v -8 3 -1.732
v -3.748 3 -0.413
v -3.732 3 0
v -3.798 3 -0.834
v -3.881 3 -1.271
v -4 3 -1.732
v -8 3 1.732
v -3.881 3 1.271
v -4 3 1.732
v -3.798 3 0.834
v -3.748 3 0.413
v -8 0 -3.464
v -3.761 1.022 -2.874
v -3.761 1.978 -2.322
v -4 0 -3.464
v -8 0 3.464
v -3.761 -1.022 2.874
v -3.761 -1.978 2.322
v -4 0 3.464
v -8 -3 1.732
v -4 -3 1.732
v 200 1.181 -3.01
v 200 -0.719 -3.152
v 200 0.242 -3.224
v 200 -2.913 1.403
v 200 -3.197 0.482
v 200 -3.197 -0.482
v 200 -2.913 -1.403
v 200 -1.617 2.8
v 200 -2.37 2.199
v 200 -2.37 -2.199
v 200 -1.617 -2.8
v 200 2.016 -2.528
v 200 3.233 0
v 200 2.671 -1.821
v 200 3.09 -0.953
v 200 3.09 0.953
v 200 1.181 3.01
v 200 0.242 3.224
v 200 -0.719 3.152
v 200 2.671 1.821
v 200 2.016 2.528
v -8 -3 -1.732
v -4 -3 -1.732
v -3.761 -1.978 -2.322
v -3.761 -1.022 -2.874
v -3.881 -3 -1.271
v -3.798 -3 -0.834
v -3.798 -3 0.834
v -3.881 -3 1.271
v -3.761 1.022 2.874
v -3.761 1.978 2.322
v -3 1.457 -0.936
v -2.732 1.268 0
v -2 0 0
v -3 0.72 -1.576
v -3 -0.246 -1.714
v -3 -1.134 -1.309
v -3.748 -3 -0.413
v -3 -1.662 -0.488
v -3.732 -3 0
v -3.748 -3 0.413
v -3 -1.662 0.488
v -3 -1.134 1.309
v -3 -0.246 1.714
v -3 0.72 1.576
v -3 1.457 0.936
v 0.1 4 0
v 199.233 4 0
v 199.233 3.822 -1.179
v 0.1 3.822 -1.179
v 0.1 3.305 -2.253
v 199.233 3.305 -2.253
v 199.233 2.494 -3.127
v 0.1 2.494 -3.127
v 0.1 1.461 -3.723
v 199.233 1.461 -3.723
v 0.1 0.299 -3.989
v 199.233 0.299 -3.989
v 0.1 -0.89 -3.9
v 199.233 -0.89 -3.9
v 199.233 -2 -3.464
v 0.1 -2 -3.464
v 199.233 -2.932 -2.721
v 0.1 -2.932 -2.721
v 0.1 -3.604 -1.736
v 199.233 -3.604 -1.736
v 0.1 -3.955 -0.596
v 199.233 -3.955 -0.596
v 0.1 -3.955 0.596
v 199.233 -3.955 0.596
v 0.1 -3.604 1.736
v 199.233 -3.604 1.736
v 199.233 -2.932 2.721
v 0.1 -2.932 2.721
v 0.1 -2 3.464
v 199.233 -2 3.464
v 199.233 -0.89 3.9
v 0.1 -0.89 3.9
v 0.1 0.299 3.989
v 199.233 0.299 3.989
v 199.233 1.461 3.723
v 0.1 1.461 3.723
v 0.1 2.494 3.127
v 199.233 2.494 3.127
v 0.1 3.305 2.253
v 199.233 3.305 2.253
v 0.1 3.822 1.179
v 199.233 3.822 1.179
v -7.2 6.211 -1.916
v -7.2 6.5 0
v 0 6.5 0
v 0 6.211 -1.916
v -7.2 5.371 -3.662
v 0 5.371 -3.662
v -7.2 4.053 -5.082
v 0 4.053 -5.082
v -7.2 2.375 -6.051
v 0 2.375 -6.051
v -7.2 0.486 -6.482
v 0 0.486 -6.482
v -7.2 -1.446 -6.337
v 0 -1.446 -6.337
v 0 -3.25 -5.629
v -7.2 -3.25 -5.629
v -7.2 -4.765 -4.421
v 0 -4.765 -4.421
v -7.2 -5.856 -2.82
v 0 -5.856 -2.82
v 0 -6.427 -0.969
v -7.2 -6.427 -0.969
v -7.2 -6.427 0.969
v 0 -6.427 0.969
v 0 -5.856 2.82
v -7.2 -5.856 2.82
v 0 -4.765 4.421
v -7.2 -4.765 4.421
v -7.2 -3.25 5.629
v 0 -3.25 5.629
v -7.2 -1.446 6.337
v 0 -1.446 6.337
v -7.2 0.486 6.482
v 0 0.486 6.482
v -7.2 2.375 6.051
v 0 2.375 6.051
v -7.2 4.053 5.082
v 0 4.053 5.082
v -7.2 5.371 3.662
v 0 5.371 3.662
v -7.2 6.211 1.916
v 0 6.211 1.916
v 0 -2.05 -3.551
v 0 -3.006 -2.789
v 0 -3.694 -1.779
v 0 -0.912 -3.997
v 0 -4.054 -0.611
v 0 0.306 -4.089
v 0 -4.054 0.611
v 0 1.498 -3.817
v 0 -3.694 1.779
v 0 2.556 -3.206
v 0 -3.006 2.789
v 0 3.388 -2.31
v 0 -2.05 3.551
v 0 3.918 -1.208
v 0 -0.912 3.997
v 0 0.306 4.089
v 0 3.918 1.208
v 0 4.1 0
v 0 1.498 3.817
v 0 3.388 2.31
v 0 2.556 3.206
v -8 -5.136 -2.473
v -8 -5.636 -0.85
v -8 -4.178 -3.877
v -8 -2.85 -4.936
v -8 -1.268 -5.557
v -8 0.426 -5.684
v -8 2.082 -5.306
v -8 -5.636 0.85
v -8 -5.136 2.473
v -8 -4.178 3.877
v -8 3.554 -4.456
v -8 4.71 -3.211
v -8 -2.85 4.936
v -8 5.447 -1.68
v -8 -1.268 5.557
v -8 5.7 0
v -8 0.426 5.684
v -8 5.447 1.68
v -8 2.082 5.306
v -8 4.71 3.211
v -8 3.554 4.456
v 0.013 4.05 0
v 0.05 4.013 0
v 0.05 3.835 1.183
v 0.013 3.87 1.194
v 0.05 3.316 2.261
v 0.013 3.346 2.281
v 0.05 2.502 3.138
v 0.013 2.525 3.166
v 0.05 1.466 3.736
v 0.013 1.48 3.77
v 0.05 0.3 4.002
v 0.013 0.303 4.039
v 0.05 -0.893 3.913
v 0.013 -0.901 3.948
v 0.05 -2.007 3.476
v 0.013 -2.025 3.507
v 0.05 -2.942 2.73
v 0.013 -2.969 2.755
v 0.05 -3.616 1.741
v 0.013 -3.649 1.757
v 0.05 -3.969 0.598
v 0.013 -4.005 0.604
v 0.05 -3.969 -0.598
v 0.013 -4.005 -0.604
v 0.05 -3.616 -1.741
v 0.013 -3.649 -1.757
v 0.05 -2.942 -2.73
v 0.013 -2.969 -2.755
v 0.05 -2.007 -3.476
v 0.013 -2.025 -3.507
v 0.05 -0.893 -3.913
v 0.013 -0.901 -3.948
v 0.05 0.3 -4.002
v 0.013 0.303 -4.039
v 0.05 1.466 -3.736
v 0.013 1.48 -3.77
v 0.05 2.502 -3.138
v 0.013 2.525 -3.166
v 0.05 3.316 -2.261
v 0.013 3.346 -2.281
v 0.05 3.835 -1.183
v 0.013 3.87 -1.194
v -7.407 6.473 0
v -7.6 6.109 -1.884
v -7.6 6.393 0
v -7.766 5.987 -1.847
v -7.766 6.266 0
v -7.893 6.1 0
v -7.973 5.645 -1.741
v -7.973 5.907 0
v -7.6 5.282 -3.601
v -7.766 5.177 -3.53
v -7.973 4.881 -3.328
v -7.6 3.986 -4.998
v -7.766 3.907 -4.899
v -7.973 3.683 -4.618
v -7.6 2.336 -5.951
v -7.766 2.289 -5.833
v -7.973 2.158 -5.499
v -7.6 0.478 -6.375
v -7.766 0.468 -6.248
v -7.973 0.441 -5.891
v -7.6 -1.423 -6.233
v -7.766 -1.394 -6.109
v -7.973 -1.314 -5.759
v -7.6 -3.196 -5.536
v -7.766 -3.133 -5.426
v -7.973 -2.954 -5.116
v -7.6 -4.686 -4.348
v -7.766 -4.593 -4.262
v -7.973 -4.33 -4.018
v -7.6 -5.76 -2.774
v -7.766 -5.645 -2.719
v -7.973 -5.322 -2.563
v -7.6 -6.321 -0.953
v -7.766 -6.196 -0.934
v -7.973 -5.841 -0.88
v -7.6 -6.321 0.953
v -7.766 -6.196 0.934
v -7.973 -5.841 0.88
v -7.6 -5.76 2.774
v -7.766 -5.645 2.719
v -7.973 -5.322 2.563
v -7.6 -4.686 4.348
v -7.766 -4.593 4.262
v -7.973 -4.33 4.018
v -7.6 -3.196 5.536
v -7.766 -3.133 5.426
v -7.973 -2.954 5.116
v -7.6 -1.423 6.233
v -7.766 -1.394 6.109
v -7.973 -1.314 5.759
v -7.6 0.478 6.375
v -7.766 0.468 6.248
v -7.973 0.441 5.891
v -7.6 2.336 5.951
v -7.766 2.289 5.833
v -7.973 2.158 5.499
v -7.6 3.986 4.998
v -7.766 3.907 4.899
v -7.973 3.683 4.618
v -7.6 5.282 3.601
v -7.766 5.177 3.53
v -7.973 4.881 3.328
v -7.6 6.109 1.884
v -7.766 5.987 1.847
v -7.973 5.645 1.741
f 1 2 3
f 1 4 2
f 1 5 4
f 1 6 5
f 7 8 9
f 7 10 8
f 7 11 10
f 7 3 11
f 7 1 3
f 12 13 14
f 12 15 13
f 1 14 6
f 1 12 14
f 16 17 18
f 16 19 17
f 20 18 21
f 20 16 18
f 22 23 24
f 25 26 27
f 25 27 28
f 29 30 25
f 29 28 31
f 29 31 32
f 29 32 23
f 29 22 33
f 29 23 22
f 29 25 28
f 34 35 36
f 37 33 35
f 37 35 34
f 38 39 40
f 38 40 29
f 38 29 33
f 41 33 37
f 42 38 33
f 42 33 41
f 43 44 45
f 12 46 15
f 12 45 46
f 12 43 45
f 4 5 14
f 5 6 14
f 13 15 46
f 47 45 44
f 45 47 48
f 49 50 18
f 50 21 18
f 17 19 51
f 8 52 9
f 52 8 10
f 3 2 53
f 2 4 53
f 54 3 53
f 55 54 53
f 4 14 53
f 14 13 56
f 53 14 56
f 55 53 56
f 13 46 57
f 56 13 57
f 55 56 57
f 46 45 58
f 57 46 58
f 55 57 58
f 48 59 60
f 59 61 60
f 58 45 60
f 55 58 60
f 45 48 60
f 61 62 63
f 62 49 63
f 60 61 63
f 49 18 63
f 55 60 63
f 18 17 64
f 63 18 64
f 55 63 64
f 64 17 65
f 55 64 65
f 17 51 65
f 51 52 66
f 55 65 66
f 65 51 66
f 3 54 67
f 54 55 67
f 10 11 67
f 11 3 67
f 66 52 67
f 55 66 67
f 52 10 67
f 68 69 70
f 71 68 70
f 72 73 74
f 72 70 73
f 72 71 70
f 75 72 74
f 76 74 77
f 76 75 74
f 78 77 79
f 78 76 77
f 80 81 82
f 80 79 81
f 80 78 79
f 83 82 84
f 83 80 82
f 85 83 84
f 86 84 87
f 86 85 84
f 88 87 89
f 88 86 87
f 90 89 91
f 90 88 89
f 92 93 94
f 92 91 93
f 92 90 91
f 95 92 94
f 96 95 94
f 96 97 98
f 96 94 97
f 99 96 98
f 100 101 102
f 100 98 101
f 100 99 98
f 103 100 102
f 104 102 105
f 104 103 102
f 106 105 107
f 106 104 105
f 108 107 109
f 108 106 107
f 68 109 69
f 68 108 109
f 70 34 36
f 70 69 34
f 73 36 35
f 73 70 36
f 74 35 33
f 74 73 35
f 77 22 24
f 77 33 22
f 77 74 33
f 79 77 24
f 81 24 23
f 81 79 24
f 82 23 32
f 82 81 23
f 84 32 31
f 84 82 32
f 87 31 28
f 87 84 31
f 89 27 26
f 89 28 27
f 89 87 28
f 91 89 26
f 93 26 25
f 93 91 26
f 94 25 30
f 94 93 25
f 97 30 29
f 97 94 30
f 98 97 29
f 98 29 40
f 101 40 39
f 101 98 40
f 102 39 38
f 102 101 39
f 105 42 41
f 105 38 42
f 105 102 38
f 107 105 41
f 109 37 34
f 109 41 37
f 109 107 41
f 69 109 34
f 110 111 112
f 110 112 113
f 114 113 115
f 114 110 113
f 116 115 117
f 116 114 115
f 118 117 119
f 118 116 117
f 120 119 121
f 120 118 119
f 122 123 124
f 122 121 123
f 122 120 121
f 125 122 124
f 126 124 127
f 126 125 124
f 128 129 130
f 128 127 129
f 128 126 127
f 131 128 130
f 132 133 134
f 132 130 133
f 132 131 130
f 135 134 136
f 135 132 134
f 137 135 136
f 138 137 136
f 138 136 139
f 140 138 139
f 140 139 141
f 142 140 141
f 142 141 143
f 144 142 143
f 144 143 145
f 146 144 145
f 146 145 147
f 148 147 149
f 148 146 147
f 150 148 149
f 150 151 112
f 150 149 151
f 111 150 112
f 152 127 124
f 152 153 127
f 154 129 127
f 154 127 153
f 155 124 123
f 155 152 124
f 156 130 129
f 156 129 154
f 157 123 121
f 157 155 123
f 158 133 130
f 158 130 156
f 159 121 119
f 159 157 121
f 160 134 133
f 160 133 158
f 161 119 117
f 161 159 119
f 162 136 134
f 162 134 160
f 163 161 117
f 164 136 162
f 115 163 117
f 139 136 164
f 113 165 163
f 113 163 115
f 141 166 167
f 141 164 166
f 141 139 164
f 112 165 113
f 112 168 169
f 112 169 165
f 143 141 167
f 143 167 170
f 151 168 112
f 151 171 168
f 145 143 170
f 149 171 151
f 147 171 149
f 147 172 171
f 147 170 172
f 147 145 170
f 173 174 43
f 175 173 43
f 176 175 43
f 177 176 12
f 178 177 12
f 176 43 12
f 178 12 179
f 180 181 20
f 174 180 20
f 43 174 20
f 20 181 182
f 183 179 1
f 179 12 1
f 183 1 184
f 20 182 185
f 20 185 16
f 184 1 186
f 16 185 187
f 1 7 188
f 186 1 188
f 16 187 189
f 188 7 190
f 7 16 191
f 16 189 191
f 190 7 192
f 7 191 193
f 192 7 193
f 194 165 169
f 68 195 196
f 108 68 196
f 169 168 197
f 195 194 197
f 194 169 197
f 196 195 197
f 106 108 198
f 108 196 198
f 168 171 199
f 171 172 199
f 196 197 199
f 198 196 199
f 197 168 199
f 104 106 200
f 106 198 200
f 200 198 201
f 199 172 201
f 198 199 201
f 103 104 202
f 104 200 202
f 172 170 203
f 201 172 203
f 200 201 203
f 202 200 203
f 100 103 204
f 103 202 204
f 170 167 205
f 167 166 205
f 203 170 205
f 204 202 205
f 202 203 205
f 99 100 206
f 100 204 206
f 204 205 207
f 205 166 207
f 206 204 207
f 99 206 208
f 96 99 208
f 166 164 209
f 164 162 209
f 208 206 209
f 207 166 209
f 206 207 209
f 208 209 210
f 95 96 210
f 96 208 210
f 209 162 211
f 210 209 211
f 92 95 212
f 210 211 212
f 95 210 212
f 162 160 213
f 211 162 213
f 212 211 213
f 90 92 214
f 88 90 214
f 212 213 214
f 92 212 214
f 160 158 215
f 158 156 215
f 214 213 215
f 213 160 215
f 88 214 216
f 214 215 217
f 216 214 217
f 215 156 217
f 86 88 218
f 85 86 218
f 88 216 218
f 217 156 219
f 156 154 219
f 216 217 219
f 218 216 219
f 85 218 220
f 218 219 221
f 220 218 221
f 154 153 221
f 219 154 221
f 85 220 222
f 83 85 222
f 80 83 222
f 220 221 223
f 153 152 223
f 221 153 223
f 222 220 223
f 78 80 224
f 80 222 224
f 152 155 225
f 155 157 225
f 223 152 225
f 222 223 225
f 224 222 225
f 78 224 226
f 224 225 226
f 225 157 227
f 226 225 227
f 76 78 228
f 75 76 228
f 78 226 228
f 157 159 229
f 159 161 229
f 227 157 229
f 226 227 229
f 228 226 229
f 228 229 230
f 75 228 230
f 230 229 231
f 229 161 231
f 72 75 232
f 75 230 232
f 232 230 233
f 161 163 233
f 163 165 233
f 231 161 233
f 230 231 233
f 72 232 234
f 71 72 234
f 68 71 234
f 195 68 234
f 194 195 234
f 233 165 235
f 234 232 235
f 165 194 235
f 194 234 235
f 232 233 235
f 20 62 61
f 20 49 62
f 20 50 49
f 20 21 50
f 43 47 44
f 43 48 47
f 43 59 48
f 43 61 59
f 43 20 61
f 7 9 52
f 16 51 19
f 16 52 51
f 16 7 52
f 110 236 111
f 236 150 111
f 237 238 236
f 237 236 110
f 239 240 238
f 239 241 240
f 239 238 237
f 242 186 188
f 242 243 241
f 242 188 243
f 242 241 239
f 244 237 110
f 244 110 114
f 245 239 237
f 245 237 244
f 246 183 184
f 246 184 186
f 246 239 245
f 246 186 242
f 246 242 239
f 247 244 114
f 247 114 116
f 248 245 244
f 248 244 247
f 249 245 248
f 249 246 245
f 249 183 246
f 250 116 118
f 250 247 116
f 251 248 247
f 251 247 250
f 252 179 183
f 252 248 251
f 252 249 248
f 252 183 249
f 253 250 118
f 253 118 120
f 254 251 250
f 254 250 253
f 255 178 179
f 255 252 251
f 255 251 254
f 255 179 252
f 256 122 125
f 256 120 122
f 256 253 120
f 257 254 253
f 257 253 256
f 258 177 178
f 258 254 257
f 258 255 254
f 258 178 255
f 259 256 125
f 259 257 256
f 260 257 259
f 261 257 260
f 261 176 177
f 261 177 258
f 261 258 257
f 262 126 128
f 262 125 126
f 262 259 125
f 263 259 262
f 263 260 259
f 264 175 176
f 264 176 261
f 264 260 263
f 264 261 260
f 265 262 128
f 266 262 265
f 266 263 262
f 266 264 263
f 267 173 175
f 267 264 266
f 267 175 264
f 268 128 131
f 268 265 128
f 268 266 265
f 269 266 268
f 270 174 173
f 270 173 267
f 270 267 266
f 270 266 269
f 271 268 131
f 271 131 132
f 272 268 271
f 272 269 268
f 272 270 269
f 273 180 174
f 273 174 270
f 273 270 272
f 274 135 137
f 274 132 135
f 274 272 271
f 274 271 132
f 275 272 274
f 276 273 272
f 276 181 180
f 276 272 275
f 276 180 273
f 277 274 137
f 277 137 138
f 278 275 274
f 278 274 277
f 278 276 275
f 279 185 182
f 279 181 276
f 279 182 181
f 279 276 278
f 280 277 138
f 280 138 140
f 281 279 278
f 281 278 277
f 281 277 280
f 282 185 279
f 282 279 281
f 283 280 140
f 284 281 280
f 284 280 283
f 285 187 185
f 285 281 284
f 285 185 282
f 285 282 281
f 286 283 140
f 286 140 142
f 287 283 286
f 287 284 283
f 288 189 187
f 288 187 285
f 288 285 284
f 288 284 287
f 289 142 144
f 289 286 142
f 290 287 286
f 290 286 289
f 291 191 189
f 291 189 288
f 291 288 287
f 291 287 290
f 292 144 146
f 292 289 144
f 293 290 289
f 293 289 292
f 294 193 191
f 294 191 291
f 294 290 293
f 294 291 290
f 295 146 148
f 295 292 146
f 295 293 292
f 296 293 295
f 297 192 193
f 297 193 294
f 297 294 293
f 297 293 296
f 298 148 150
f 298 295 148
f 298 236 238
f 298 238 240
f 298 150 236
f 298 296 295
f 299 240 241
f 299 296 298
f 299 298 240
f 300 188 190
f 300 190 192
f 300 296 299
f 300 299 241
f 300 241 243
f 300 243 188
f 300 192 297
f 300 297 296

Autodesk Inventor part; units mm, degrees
ref_plane "YZ Plane" through (0, 0, 0) normal (1, 0, 0) x (0, 1, 0)
ref_plane "XZ Plane" through (0, 0, 0) normal (0, 1, 0) x (-1, 0, 0)
sketch "Sketch1" plane through (0, 0, 0) normal (0, 0, 1) x (1, 0, 0)
  line L0 (-2, 0) -> (200, 0)
  line L1 (200, 0) -> (200, 4)
  line L2 (200, 4) -> (172, 4)
  line L3 (172, 4) -> (171.2331, 4)
  line L4 (171.2331, 4) -> (0, 4)
  line L5 (0, 4) -> (0, 6.5)
  line L6 (0, 6.5) -> (-8, 6.5)
  line L7 (-8, 6.5) -> (-8, 3.4641)
  line L8 (-8, 3.4641) -> (-4, 3.4641)
  line L9 (-4, 3.4641) -> (-2, 0)
  line L10 (-41.6, 0) -> (193.6, 0) projected
  line L11 (0, -1.3) -> (0, 7.8) projected
  line L12 (172, 4) -> (0, 4) construction
  dimension "d1" = 28
  dimension "d2" = 0.7669
  dimension "d3" = 8
  dimension "d4" = 4
  dimension "d5" = 60
  dimension "d6" = 8
  dimension "d7" = 8
  dimension "d8" = 6.9282
  dimension "d9" = 13
  dimension "d26" = 200
revolve "Body" add sketch "Sketch1" angle 360 about axis through (-2, 0, 0) along (1, 0, 0)
sketch "Sketch2" plane through (-8, 0, 0) normal (-1, 0, 0) x (0, 0, 1)
  circle A0 centre (0, 0) radius 3.4641 projected
  line L0 (0, -9.1) -> (0, 9.1) projected
  line L1 (-9.1, 0) -> (9.1, 0) projected
  line L2 (3.4641, 0) -> (1.7321, -3)
  line L3 (1.7321, -3) -> (-1.7321, -3)
  line L4 (-1.7321, -3) -> (-3.4641, 0)
  line L5 (-3.4641, 0) -> (-1.7321, 3)
  line L6 (-1.7321, 3) -> (1.7321, 3)
  line L7 (1.7321, 3) -> (3.4641, 0)
extrude "Slot" add sketch "Sketch2" against normal up to next contours L7 A0 | A0 L2 | L6 L0 A0 | A0 L0 L3 | L0 L6 A0 | A0 L3 L0 | L4 A0 | A0 L5
fillet "Fillet1" radius 0.8 1 edges at (-8, -6.5, 0)
thread "Thread" size "M8x1.25" class "6g" standard "ISO Metric profile" length 28
chamfer "Chamfer1" distance 0.7668 distance2 0.7668 1 edges at (200, -4, 0) measured on face at (200, -0.5839, -0.3933)
ref_plane "Work Plane1" through (29, 0, 0) normal (0, -1, 0) x (1, 0, 0)
fillet "Fillet2" radius 0.1 1 edges at (0, -4, 0)
equation "\"d1\" = GEL"
equation "\"d3\" = KOH"
equation "\"d4\" = INTI"
equation "\"d6\" = GD"
equation "\"d7\" = BDM"
equation "\"d8\" = 1.1547 * SW"
equation "\"d9\" = KOD"
equation "\"d26\" = NLG"
equation "\"d30\" = R"
equation "\"d17\" = RR"
equation "\"d13\" = GEL"
equation "\"d15\" = -0.5 * SPD + 0.5 * GD"
equation "\"d16\" = GUL"
equation "\"GD\" = NND"
equation "\"NLG\" = 200"
equation "\"GEL\" = 28"
equation "\"KOD\" = 13"
equation "\"KOH\" = 8"
equation "\"INTI\" = 4"
equation "\"GAL\" = 0.61345 * PTC"
equation "\"GUL\" = 0.61345 * PTC"
equation "\"BDM\" = NND"
equation "\"SW\" = 6"
equation "\"RR\" = 0.8"
equation "\"SPD\" = 6.46638"
equation "\"R\" = 0.1"
equation "\"TOA\" = 30deg"
equation "\"THREADDIA\" = 8"
equation "\"PTC\" = 1.25"
equation "\"NND\" = 8"
equation "\"E0\" = 1.155 * SW"
equation "\"GD1\" = THREADDIA - 1.2269 * PTC"
properties part number "ANSI B18.3.1M - M8x1.25 x 160" material "Steel, Mild"
